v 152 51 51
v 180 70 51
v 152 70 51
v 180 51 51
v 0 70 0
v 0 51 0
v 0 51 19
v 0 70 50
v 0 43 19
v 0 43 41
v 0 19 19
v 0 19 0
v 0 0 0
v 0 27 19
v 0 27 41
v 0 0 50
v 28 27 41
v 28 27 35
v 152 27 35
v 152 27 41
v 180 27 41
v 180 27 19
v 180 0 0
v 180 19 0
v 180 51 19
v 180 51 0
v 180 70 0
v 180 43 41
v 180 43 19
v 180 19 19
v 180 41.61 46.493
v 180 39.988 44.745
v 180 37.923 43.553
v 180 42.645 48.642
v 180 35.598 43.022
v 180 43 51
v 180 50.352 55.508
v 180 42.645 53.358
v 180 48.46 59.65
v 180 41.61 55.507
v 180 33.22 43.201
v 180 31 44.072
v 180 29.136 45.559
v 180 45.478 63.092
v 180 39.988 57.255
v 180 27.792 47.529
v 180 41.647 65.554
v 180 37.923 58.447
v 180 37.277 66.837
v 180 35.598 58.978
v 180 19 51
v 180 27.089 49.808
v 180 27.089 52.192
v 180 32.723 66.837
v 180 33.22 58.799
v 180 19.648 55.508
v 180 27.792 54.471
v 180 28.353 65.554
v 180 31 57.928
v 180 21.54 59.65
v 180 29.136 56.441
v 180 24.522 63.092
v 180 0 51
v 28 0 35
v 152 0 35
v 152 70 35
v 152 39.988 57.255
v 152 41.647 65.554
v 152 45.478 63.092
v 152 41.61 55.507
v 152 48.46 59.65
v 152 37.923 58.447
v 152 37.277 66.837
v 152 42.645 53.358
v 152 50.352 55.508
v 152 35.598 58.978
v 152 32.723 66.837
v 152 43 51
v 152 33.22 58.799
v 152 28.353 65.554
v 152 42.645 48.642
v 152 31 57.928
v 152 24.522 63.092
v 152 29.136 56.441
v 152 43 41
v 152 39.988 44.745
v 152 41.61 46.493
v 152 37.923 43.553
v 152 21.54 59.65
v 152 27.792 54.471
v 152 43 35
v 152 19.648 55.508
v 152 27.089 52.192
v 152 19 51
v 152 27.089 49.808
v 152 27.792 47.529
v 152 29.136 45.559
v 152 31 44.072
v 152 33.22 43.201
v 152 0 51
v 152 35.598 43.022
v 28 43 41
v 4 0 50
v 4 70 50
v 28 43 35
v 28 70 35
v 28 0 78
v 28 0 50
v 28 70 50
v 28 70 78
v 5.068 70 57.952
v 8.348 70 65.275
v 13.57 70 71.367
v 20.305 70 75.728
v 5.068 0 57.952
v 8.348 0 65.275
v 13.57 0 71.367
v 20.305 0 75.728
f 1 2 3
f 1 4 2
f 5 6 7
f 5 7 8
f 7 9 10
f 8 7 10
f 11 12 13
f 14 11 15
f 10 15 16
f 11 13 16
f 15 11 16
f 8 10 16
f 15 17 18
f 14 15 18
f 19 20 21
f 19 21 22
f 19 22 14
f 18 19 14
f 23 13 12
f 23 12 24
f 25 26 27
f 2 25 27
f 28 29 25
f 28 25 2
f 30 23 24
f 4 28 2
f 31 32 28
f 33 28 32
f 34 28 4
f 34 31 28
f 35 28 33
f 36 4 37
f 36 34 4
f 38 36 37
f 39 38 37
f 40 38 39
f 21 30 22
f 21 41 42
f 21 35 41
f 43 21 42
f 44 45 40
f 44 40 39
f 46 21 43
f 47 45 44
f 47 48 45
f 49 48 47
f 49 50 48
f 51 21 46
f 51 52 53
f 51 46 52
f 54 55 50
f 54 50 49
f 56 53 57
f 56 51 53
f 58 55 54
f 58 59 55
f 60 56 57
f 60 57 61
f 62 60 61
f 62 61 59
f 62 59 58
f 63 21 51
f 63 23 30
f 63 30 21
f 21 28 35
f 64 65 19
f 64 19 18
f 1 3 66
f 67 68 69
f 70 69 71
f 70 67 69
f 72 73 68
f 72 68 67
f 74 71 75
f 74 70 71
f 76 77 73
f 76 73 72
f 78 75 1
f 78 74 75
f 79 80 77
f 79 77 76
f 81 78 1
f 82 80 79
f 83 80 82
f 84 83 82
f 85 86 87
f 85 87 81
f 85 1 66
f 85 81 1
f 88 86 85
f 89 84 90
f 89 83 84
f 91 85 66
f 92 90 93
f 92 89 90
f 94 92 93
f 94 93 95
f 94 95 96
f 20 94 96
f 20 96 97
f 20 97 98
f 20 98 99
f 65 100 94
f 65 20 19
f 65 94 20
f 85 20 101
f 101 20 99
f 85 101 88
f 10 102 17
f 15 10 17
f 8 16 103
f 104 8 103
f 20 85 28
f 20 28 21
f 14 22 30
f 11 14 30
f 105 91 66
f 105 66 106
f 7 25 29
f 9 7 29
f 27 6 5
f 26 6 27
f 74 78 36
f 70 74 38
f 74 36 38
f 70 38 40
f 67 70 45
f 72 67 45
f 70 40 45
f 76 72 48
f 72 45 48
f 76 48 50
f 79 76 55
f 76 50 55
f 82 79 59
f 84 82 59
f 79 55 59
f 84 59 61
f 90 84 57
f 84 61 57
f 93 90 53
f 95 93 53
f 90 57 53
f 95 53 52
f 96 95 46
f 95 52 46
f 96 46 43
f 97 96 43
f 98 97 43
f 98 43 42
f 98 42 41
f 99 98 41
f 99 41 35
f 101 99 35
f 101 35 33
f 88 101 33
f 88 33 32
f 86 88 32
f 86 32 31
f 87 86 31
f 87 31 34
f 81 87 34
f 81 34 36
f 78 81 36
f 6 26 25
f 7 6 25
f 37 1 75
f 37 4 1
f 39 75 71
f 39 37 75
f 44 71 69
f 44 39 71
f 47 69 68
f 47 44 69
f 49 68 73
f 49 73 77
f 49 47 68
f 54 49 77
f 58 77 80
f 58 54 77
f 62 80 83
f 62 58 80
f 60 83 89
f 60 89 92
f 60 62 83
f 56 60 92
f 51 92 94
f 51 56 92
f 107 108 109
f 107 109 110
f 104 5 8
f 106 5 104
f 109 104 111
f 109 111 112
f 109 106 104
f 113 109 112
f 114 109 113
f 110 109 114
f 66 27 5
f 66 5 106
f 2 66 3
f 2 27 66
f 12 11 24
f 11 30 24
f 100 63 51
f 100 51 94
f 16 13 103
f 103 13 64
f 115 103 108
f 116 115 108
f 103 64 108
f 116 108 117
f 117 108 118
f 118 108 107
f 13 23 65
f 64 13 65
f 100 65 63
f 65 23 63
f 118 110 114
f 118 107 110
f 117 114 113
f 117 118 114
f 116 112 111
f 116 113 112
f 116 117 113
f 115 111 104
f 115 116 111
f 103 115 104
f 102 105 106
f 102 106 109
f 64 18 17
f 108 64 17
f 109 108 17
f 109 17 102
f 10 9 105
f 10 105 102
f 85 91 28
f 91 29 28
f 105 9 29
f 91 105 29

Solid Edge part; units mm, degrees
sketch "Sketch1" plane through (0, 0, 0) normal (0, -1, 0) x (1, 0, 0)
  line L0 (0, 50) -> (4, 50)
  arc A0 (4, 50) -> (28, 78) centre (31.9985, 50.287) cw
  line L1 (28, 50) -> (28, 78)
  line L2 (28, 35) -> (28, 50)
  line L3 (152, 35) -> (28, 35)
  line L4 (152, 51) -> (152, 35)
  line L5 (180, 51) -> (152, 51)
  line L6 (180, 0) -> (180, 51)
  line L7 (0, 0) -> (180, 0)
  line L8 (0, 0) -> (0, 50)
extrude "Protrusion1" add sketch "Sketch1" against normal blind 70
sketch "Sketch2" plane through (180, 35, 25.5) normal (1, 0, 0) x (0, 1, 0)
  circle A0 centre (0, 25.5) radius 16
extrude "ExtrudedProtrusion_2" add sketch "Sketch2" against normal blind 28
sketch "Sketch3" plane through (180, 35, 33.5) normal (1, 0, 0) x (0, 1, 0)
  circle A0 centre (0, 17.5) radius 8
extrude "ExtrudedCutout_1" cut sketch "Sketch3" against normal blind 28 and the other way blind 1
sketch "Sketch4" plane through (180, 35, 33.5) normal (1, 0, 0) x (0, 1, 0)
  line L0 (16, -33.5) -> (16, -14.5)
  line L1 (16, -14.5) -> (8, -14.5)
  line L2 (8, -14.5) -> (8, 7.5)
  line L3 (8, 7.5) -> (-8, 7.5)
  line L4 (-8, 7.5) -> (-8, -14.5)
  line L5 (-8, -14.5) -> (-16, -14.5)
  line L6 (-16, -14.5) -> (-16, -33.5)
  line L7 (-16, -33.5) -> (16, -33.5)
extrude "ExtrudedCutout_2" cut sketch "Sketch4" against normal blind 180 and the other way blind 1
